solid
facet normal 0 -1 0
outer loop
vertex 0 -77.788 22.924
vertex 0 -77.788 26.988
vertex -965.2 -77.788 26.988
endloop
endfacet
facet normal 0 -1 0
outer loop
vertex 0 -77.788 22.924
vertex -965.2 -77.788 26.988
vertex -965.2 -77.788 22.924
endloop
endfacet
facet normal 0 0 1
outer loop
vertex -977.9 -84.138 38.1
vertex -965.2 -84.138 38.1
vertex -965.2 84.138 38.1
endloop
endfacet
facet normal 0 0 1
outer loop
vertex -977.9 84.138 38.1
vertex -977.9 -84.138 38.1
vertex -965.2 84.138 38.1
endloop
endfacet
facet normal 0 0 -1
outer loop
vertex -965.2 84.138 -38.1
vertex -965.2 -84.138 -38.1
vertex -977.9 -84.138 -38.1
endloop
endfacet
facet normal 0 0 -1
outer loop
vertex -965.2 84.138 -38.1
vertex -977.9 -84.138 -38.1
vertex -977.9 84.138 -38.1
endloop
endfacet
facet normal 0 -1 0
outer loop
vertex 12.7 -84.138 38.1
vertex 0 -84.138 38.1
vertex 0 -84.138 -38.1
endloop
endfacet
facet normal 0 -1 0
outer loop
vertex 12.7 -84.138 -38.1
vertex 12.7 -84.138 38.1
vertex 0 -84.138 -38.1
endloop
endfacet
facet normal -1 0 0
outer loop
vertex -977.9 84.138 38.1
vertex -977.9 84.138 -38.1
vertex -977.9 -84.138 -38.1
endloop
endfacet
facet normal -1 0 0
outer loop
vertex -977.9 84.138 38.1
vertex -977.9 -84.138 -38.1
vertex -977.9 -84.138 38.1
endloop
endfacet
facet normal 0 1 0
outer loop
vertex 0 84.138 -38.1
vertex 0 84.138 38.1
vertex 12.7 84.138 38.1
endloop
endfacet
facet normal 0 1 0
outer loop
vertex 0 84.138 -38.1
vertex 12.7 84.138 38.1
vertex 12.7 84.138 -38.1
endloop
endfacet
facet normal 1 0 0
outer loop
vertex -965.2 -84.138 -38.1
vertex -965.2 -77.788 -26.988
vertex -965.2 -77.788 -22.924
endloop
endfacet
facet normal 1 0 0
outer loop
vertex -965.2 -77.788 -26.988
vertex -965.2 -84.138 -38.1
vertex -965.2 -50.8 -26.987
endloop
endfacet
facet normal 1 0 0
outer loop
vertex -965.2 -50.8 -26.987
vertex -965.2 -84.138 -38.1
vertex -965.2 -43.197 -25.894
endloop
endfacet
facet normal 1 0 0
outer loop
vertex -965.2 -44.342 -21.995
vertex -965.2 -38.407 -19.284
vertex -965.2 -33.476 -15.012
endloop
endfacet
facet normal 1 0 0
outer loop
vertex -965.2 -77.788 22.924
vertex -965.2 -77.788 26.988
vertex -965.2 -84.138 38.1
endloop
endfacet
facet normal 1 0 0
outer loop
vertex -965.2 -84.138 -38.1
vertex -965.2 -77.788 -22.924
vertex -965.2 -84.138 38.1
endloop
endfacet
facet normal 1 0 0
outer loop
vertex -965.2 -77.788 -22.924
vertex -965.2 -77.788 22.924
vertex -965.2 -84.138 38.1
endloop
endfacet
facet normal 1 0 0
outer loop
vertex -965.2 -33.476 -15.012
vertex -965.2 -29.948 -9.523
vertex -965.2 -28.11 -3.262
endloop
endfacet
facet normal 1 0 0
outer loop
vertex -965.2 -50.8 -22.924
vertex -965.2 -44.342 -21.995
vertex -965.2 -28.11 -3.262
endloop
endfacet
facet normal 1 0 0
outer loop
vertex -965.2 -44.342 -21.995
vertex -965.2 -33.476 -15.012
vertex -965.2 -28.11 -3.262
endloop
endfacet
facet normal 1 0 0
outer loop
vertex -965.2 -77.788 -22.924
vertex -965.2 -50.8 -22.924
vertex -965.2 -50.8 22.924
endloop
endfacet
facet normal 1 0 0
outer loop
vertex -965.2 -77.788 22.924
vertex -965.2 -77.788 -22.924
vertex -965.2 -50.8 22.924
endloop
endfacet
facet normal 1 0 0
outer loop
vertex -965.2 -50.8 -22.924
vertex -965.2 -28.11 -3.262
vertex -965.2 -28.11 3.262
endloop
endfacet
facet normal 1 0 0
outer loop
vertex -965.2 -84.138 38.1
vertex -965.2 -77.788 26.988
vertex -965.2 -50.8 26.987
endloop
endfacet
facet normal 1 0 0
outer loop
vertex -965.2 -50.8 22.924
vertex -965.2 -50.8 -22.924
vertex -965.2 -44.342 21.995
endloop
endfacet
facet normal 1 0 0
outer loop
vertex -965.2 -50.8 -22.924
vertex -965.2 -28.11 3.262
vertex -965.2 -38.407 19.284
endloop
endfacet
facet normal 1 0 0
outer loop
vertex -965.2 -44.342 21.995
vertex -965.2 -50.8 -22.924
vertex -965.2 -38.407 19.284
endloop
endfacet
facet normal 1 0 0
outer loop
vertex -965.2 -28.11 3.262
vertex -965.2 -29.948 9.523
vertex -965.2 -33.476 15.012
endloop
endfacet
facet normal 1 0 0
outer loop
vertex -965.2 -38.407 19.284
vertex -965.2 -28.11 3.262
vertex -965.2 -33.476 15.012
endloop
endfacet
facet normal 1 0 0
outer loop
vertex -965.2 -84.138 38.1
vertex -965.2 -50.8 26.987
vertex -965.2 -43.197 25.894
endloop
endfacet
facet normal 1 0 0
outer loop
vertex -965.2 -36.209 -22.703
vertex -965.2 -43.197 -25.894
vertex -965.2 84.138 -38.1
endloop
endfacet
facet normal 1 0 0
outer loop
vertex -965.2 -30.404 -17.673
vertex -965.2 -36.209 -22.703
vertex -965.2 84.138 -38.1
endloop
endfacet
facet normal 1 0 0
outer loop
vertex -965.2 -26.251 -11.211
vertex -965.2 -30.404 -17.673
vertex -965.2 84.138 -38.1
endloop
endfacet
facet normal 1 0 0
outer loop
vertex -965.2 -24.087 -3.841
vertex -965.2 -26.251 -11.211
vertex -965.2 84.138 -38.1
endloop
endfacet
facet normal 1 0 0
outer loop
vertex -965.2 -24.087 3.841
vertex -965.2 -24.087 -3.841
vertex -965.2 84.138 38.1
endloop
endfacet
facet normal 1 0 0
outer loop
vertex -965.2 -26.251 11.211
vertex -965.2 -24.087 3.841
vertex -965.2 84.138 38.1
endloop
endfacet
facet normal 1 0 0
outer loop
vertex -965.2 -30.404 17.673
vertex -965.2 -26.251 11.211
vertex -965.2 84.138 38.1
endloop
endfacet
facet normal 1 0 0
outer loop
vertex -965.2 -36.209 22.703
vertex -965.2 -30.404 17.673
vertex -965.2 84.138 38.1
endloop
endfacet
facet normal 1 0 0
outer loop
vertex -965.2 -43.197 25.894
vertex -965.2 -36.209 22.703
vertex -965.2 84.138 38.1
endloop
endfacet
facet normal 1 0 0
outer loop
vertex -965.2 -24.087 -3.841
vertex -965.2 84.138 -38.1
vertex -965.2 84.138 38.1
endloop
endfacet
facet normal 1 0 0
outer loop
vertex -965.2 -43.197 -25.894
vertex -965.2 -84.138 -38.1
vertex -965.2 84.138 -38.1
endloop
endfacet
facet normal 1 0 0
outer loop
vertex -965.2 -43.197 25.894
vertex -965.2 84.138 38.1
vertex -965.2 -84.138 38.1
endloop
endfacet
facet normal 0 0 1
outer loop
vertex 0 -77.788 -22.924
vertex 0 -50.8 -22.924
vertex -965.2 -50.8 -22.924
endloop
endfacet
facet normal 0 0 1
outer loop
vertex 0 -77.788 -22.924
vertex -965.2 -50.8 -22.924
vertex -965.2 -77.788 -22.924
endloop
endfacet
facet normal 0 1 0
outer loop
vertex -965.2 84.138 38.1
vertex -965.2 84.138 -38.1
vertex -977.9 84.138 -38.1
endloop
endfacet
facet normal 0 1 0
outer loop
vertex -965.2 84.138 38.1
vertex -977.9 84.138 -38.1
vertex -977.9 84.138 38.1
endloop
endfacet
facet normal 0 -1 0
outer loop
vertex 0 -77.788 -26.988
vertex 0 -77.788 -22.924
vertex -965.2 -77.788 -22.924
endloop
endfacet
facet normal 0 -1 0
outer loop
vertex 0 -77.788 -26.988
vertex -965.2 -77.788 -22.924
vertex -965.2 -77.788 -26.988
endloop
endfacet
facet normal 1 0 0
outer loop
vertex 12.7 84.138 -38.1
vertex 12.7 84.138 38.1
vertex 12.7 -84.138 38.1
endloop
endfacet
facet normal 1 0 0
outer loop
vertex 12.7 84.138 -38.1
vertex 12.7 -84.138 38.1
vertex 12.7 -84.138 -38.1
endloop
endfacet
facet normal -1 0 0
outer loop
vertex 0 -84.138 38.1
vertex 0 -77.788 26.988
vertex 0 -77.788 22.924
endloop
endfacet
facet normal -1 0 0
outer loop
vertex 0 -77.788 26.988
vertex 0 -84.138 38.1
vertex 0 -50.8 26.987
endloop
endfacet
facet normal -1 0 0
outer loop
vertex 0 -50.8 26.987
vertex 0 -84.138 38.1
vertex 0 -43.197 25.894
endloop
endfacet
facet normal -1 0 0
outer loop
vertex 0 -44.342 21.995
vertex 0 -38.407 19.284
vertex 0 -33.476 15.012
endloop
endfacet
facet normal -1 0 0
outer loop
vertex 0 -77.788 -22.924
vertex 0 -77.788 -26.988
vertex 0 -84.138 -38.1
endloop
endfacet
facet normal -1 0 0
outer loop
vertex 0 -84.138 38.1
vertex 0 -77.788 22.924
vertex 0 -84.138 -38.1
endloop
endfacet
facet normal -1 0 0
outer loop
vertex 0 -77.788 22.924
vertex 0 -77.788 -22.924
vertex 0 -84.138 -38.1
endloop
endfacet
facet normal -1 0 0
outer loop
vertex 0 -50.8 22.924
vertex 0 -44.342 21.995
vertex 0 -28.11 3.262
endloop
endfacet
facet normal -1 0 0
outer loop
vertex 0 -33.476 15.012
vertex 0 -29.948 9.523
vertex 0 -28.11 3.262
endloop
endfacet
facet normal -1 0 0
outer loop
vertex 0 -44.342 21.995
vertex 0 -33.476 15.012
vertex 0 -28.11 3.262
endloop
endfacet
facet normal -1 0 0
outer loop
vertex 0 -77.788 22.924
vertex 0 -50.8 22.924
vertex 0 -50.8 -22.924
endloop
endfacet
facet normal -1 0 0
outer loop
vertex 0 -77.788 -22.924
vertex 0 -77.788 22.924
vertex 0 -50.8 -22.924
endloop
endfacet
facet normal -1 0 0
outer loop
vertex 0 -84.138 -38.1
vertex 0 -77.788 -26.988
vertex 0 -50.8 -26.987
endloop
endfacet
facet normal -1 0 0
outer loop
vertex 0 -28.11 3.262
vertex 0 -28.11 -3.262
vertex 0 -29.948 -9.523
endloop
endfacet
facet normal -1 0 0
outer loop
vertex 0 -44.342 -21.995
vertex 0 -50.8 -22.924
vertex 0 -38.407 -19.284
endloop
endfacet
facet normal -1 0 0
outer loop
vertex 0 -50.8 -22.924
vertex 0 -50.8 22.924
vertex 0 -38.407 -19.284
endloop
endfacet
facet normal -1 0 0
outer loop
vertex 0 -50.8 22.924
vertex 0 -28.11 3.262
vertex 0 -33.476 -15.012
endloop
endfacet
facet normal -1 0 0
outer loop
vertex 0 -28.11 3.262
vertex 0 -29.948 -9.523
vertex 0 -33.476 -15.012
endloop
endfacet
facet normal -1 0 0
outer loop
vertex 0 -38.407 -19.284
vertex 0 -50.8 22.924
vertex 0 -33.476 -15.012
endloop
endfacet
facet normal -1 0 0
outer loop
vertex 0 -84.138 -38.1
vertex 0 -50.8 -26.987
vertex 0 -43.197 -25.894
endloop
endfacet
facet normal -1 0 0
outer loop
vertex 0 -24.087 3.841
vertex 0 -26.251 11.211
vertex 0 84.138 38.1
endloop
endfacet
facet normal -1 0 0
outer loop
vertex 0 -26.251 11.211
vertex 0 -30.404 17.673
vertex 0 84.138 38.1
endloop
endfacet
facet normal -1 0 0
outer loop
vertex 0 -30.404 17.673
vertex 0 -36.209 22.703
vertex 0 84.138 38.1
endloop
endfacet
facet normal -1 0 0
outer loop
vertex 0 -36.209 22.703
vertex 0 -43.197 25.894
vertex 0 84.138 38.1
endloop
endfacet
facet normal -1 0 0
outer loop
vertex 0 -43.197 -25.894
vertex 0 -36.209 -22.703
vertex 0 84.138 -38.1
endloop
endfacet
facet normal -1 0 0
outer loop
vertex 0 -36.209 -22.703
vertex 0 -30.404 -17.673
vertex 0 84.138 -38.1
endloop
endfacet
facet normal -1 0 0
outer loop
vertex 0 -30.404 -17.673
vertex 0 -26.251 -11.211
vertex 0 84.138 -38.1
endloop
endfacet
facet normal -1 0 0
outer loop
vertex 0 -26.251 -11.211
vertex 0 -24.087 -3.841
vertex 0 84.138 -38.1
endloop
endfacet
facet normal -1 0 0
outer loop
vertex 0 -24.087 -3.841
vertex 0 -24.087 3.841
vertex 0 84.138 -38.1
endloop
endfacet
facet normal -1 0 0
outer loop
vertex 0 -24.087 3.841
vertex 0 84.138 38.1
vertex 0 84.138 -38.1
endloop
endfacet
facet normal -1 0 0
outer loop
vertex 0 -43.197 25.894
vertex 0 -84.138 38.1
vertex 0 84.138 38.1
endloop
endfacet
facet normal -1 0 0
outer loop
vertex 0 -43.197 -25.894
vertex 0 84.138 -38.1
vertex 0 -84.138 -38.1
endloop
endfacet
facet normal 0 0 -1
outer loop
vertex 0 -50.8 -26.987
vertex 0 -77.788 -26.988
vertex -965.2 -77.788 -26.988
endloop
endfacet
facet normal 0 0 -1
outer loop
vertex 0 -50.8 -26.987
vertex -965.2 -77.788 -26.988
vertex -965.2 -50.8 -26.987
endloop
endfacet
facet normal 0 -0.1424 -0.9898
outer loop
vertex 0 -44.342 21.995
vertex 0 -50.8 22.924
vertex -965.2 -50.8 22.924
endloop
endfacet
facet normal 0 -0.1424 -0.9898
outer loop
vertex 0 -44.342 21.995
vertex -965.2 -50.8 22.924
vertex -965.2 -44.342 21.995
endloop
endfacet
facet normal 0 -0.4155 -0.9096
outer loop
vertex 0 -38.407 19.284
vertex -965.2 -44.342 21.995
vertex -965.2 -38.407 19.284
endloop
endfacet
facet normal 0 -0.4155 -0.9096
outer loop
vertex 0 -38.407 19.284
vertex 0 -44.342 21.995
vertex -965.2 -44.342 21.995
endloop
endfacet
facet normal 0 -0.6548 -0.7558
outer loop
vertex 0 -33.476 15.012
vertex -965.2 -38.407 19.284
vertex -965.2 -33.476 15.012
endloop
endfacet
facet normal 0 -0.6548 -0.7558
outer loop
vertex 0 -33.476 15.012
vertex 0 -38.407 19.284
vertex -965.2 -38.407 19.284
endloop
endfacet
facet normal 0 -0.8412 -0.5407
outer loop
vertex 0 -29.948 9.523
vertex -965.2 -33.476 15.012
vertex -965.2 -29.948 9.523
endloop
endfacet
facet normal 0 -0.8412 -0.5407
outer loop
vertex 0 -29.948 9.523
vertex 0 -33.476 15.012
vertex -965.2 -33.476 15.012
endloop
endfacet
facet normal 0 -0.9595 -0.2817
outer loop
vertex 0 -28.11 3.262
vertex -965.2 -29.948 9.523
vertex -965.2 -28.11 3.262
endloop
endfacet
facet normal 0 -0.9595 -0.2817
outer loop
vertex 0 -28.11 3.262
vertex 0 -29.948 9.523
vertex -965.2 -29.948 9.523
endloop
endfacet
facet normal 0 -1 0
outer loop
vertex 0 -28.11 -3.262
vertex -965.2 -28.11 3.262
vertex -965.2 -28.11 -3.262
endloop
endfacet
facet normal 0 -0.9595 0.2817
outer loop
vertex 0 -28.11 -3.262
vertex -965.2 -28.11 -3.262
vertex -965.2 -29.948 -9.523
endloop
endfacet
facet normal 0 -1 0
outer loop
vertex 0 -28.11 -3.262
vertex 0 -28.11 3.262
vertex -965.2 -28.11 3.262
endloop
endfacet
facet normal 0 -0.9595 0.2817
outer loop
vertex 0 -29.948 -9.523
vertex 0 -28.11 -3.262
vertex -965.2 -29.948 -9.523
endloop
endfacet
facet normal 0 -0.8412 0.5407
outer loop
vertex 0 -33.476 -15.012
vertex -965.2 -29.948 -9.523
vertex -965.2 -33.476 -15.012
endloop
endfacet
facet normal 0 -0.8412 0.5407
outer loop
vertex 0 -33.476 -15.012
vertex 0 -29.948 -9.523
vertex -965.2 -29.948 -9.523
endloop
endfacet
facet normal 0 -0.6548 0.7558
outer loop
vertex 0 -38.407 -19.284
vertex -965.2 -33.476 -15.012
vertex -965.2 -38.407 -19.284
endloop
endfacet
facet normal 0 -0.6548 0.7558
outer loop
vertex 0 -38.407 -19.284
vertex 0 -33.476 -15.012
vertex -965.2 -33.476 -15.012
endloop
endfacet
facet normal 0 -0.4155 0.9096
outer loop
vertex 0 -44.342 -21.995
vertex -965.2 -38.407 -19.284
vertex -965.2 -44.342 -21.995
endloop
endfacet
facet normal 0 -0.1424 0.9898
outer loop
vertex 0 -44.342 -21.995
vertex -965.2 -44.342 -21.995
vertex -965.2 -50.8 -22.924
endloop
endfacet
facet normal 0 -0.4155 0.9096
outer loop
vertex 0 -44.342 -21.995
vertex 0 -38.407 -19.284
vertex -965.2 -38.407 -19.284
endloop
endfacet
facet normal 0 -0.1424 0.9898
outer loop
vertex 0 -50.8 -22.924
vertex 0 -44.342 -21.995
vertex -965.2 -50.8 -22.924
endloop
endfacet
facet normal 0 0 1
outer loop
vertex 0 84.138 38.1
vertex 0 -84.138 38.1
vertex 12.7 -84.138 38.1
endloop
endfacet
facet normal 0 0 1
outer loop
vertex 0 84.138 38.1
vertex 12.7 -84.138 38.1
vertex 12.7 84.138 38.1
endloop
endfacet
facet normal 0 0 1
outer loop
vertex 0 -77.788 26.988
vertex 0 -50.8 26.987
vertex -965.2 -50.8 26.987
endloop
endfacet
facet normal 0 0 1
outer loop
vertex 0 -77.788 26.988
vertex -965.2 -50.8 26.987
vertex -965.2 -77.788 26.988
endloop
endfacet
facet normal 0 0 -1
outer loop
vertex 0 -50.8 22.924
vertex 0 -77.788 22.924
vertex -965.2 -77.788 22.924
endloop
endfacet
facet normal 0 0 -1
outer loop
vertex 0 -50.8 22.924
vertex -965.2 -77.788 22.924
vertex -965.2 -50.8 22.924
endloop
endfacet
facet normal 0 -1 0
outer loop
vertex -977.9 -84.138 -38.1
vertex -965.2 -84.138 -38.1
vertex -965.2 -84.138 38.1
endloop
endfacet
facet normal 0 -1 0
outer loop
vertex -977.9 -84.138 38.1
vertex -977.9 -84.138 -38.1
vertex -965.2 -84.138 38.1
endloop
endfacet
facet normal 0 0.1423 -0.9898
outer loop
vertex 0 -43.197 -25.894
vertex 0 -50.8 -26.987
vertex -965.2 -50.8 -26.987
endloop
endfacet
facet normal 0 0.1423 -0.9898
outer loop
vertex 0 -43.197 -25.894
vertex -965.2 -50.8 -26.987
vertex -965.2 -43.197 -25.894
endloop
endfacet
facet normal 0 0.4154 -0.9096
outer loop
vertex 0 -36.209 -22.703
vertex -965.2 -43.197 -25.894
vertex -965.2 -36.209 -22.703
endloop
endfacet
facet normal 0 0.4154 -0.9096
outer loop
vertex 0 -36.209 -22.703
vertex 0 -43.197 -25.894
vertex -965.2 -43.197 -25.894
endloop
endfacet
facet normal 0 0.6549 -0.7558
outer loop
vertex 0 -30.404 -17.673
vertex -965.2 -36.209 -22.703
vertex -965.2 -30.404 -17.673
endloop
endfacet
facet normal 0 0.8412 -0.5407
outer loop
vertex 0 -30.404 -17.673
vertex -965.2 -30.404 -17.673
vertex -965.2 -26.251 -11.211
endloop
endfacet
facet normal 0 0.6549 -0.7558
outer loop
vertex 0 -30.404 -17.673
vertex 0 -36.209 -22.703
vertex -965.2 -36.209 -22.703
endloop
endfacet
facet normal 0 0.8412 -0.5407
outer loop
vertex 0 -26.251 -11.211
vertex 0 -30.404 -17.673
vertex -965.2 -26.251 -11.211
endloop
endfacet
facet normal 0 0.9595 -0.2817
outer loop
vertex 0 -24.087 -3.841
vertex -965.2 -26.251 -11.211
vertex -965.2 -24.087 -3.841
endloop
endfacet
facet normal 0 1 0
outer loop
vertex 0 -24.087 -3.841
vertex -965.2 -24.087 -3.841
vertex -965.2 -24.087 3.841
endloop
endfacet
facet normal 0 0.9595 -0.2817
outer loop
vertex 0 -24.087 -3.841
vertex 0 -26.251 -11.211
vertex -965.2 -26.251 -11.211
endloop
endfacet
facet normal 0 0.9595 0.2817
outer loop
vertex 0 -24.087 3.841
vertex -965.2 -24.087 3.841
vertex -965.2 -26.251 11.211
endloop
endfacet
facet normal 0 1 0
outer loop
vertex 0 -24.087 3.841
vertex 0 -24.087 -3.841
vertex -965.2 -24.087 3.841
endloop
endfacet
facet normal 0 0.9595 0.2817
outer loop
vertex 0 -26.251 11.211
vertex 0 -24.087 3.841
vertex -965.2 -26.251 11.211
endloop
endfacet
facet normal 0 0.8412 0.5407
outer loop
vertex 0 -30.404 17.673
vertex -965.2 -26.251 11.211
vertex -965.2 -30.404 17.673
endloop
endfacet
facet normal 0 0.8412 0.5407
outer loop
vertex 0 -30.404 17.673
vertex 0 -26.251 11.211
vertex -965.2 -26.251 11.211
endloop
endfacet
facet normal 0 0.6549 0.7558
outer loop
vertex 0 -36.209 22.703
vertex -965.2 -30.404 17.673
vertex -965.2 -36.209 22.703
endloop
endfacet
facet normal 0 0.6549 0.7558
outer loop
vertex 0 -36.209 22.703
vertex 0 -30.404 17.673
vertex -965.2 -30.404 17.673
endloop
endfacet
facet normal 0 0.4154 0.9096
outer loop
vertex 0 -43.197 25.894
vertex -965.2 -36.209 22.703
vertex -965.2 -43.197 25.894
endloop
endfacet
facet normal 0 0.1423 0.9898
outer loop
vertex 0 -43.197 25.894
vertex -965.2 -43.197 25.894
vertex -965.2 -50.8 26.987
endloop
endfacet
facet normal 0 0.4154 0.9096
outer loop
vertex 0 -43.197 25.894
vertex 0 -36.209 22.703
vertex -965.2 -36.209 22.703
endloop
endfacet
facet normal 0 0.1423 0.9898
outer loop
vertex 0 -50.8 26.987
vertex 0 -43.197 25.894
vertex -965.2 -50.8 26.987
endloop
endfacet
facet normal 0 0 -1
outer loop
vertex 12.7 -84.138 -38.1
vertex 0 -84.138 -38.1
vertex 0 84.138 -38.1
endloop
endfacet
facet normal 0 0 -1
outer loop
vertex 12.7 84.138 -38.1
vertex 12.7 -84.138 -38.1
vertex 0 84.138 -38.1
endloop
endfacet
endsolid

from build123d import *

# Parameters (mm, degrees)
SKETCH1_W           = 76.2
SKETCH1_H           = 168.275
BOSS_EXTRUDE1_DEPTH = 12.7
BOSS_EXTRUDE2_DEPTH = 965.2
SKETCH3_W           = 76.2
SKETCH3_H           = 168.275
BOSS_EXTRUDE3_DEPTH = 12.7


with BuildPart() as part:
    # Sketch1 → Boss-Extrude1 (new body)
    with BuildSketch(Plane(origin=(0, 0, 0), x_dir=(0, 0, -1), z_dir=(1, 0, 0))):
        Rectangle(SKETCH1_W, SKETCH1_H)
    extrude(amount=BOSS_EXTRUDE1_DEPTH)

    # Sketch2 → Boss-Extrude2 (add)
    with BuildSketch(Plane.ZY):
        with BuildLine():
            Line((-26.9875, -77.7875), (-26.9875, -50.8))
            ThreePointArc((-26.9875, -50.8), (0, -23.8125), (26.9875, -50.8))
            Line((26.9875, -50.8), (26.9875, -77.7875))
            Line((26.9875, -77.7875), (22.9235, -77.7875))
            Line((22.9235, -77.7875), (22.9235, -50.8))
            ThreePointArc((22.9235, -50.8), (0, -27.8765), (-22.9235, -50.8))
            Line((-22.9235, -50.8), (-22.9235, -77.7875))
            Line((-22.9235, -77.7875), (-26.9875, -77.7875))
        make_face()
    extrude(amount=BOSS_EXTRUDE2_DEPTH)

    # Sketch3 → Boss-Extrude3 (add)
    with BuildSketch(Plane.ZY.offset(965.2)):
        Rectangle(SKETCH3_W, SKETCH3_H)
    extrude(amount=BOSS_EXTRUDE3_DEPTH)


solid = part.part
